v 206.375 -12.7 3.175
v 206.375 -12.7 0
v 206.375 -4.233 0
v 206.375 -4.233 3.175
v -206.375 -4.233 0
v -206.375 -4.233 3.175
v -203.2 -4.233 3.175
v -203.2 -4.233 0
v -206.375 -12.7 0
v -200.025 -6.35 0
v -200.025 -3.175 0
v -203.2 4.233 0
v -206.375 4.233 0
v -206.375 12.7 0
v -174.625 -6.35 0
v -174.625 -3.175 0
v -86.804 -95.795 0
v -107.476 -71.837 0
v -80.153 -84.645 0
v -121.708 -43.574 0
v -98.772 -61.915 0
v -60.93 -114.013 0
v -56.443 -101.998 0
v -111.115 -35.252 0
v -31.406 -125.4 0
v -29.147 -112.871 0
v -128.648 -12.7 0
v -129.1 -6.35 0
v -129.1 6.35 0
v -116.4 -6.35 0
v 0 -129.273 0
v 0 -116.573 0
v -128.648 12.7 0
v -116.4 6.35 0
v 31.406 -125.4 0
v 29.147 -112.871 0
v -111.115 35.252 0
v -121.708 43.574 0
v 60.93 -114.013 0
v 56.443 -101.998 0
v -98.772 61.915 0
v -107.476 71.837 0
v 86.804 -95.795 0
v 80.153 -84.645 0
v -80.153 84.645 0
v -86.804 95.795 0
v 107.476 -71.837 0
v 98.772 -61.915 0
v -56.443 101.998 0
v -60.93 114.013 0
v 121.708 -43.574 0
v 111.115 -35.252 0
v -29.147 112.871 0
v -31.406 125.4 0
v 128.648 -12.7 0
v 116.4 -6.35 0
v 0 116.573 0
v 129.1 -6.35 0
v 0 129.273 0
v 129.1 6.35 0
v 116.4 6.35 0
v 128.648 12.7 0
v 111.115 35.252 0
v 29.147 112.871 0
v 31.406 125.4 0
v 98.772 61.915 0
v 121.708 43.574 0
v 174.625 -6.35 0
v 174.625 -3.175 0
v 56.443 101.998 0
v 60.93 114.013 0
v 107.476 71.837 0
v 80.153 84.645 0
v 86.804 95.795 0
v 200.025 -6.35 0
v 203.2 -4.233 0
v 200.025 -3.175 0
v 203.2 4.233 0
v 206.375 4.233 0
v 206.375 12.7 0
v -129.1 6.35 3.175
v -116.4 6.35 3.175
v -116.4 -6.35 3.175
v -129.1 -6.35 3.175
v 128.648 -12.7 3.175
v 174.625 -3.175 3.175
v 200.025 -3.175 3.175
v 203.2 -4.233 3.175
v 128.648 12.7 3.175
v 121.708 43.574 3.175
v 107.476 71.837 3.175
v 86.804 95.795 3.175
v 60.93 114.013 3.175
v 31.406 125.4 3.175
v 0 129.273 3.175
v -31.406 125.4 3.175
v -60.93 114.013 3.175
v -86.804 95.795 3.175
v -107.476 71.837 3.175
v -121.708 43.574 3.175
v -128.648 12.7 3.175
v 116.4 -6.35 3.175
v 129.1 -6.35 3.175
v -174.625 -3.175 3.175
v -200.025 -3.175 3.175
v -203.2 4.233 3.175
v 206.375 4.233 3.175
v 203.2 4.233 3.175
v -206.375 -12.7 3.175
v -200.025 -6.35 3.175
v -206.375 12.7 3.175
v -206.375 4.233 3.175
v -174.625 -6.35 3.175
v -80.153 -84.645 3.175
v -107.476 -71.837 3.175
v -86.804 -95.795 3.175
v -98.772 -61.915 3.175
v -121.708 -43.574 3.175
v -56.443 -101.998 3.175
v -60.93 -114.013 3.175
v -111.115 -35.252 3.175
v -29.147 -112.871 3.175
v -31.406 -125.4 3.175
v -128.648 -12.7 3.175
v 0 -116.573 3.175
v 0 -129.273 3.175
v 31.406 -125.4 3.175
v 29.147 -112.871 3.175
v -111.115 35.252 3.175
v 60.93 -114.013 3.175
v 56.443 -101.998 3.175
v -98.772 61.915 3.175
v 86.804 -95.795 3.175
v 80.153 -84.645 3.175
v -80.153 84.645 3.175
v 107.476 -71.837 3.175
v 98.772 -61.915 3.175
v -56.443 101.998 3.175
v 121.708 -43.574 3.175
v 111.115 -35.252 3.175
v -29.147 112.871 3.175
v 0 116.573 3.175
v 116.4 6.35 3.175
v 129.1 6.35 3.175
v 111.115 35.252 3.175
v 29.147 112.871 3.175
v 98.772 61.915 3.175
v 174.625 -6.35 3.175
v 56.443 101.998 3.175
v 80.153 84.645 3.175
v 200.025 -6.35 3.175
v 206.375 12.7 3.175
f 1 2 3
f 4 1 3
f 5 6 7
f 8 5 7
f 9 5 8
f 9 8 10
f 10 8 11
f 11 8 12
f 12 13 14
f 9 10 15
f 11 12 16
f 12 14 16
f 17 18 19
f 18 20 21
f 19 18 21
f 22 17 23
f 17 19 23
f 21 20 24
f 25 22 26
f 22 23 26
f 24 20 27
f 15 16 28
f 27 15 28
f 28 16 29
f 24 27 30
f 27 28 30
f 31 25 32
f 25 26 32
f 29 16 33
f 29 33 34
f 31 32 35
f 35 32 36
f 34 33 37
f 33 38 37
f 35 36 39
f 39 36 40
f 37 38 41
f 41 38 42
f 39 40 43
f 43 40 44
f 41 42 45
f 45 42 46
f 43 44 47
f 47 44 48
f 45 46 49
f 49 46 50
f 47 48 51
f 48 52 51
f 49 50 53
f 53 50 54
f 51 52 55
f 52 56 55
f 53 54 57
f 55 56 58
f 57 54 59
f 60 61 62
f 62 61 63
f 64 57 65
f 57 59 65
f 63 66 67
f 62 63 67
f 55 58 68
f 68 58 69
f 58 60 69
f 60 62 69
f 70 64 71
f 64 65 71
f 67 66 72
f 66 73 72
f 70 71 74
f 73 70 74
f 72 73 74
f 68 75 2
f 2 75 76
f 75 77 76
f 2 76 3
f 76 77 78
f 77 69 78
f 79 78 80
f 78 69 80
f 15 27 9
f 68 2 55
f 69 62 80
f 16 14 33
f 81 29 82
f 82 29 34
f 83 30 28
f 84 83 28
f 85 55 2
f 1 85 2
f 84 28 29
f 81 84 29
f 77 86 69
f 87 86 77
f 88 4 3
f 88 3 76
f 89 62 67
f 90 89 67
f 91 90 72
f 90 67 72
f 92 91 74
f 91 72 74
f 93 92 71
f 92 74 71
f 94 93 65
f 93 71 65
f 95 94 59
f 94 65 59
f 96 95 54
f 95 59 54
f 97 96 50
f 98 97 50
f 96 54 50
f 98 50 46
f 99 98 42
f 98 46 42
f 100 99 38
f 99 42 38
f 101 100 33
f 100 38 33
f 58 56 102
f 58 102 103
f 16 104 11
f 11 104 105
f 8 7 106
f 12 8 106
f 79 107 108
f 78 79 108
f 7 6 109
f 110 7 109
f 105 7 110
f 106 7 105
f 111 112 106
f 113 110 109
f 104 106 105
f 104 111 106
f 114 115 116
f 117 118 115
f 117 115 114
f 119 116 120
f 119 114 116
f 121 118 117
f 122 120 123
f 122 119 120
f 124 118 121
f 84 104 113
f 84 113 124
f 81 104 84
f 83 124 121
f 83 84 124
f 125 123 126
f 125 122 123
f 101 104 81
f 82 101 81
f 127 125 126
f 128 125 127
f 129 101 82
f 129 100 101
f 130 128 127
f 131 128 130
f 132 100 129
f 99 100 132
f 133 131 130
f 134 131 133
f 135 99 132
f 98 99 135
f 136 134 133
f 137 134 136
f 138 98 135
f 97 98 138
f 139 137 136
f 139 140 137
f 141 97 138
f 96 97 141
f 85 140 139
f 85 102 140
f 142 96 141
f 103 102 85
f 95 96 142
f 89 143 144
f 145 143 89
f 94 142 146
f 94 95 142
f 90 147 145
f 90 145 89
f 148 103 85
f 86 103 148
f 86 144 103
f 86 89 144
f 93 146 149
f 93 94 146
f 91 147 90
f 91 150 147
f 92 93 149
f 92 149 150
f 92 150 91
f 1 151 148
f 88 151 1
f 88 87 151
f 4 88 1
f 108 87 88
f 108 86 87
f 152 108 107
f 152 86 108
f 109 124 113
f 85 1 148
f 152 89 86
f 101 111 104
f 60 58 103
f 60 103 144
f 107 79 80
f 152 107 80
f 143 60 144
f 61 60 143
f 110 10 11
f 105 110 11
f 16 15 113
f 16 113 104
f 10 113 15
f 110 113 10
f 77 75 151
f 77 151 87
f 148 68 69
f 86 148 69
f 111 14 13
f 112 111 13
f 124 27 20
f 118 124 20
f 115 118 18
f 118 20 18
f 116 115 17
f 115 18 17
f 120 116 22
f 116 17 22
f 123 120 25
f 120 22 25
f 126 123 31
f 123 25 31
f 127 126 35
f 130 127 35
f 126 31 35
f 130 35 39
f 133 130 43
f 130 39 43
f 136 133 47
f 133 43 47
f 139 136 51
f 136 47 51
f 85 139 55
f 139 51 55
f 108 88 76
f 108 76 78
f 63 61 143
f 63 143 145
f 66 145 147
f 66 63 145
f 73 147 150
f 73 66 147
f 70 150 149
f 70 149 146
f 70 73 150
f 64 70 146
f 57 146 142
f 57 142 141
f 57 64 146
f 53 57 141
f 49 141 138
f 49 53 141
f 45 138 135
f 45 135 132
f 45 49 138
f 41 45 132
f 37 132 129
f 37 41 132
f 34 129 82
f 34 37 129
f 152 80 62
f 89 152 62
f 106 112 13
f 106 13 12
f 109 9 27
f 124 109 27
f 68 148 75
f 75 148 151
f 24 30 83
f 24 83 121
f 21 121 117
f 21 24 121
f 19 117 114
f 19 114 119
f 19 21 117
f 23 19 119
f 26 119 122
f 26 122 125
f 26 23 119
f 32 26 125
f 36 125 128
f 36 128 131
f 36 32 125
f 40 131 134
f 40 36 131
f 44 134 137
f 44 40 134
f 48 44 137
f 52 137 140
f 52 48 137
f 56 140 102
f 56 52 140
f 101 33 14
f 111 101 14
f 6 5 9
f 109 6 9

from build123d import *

# Parameters (mm, degrees)
SKETCH1_R           = 129.2733
SKETCH1_R_2         = 116.5733
BOSS_EXTRUDE1_DEPTH = 3.175
SKETCH2_W           = 3.175
SKETCH2_H           = 8.466666666
CUT_EXTRUDE1_DEPTH  = 3.175
CUT_EXTRUDE6_START  = -3.175
CUT_EXTRUDE6_DEPTH  = 3.175
SKETCH4_W           = 25.4
SKETCH4_H           = 3.175
CUT_EXTRUDE7_DEPTH  = 3.175


with BuildPart() as part:
    # Sketch1 → Boss-Extrude1 (new body)
    # profile 1 of 3: a face of its own
    with BuildSketch(Plane.XY):
        with BuildLine():
            Line((-206.375, -12.7), (-128.647954095, -12.7))
            ThreePointArc((-128.647954095, -12.7), (-129.2733, 0), (-128.647954095, 12.7))
            Line((-128.647954095, 12.7), (-206.375, 12.7))
            Line((-206.375, 12.7), (-206.375, -12.7))
        make_face()
    # profile 2 of 3: a face of its own
    with BuildSketch(Plane.XY):
        Circle(SKETCH1_R)
        Circle(SKETCH1_R_2, mode=Mode.SUBTRACT)
    # profile 3 of 3: a face of its own
    with BuildSketch(Plane.XY):
        with BuildLine():
            ThreePointArc((129.2733, 0), (129.116868877, -6.357693322), (128.647954095, -12.7))
            Line((128.647954095, -12.7), (206.375, -12.7))
            Line((206.375, -12.7), (206.375, 12.7))
            Line((206.375, 12.7), (128.647954095, 12.7))
            ThreePointArc((128.647954095, 12.7), (129.116868877, 6.357693322), (129.2733, 0))
        make_face()
    extrude(amount=BOSS_EXTRUDE1_DEPTH)

    # Sketch2 → Cut-Extrude1 (cut)
    with BuildSketch(Plane.XY.offset(3.175)):
        with Locations((-204.7875, 0)):
            Rectangle(SKETCH2_W, SKETCH2_H)
    cut_extrude1 = extrude(amount=-CUT_EXTRUDE1_DEPTH, mode=Mode.SUBTRACT)

    # Mirror1: Cut-Extrude1 across plane
    add(cut_extrude1.mirror(Plane(origin=(0, 0, 0), x_dir=(0, 0, 1), z_dir=(1, 0, 0))), mode=Mode.SUBTRACT)

    # Sketch3 → Cut-Extrude6 (cut)
    with BuildSketch(Plane.XY.offset(3.175).offset(CUT_EXTRUDE6_START)):
        with BuildLine():
            Line((-116.400222392, -6.35), (-129.100222392, -6.35))
            Line((-129.100222392, -6.35), (-129.100222392, 6.35))
            Line((-129.100222392, 6.35), (-116.400222392, 6.35))
            ThreePointArc((-116.400222392, 6.35), (-116.5733, 0), (-116.400222392, -6.35))
        make_face()
    cut_extrude6 = extrude(amount=CUT_EXTRUDE6_DEPTH, mode=Mode.SUBTRACT)

    # Mirror2: Cut-Extrude6 across plane
    add(cut_extrude6.mirror(Plane(origin=(0, 0, 0), x_dir=(0, 0, 1), z_dir=(1, 0, 0))), mode=Mode.SUBTRACT)

    # Sketch4 → Cut-Extrude7 (cut)
    with BuildSketch(Plane.XY.offset(3.175)):
        with Locations((187.325, -4.7625)):
            Rectangle(SKETCH4_W, SKETCH4_H)
    cut_extrude7 = extrude(amount=-CUT_EXTRUDE7_DEPTH, mode=Mode.SUBTRACT)

    # Mirror3: Cut-Extrude7 across plane
    add(cut_extrude7.mirror(Plane(origin=(0, 0, 0), x_dir=(0, 0, 1), z_dir=(1, 0, 0))), mode=Mode.SUBTRACT)


solid = part.part
